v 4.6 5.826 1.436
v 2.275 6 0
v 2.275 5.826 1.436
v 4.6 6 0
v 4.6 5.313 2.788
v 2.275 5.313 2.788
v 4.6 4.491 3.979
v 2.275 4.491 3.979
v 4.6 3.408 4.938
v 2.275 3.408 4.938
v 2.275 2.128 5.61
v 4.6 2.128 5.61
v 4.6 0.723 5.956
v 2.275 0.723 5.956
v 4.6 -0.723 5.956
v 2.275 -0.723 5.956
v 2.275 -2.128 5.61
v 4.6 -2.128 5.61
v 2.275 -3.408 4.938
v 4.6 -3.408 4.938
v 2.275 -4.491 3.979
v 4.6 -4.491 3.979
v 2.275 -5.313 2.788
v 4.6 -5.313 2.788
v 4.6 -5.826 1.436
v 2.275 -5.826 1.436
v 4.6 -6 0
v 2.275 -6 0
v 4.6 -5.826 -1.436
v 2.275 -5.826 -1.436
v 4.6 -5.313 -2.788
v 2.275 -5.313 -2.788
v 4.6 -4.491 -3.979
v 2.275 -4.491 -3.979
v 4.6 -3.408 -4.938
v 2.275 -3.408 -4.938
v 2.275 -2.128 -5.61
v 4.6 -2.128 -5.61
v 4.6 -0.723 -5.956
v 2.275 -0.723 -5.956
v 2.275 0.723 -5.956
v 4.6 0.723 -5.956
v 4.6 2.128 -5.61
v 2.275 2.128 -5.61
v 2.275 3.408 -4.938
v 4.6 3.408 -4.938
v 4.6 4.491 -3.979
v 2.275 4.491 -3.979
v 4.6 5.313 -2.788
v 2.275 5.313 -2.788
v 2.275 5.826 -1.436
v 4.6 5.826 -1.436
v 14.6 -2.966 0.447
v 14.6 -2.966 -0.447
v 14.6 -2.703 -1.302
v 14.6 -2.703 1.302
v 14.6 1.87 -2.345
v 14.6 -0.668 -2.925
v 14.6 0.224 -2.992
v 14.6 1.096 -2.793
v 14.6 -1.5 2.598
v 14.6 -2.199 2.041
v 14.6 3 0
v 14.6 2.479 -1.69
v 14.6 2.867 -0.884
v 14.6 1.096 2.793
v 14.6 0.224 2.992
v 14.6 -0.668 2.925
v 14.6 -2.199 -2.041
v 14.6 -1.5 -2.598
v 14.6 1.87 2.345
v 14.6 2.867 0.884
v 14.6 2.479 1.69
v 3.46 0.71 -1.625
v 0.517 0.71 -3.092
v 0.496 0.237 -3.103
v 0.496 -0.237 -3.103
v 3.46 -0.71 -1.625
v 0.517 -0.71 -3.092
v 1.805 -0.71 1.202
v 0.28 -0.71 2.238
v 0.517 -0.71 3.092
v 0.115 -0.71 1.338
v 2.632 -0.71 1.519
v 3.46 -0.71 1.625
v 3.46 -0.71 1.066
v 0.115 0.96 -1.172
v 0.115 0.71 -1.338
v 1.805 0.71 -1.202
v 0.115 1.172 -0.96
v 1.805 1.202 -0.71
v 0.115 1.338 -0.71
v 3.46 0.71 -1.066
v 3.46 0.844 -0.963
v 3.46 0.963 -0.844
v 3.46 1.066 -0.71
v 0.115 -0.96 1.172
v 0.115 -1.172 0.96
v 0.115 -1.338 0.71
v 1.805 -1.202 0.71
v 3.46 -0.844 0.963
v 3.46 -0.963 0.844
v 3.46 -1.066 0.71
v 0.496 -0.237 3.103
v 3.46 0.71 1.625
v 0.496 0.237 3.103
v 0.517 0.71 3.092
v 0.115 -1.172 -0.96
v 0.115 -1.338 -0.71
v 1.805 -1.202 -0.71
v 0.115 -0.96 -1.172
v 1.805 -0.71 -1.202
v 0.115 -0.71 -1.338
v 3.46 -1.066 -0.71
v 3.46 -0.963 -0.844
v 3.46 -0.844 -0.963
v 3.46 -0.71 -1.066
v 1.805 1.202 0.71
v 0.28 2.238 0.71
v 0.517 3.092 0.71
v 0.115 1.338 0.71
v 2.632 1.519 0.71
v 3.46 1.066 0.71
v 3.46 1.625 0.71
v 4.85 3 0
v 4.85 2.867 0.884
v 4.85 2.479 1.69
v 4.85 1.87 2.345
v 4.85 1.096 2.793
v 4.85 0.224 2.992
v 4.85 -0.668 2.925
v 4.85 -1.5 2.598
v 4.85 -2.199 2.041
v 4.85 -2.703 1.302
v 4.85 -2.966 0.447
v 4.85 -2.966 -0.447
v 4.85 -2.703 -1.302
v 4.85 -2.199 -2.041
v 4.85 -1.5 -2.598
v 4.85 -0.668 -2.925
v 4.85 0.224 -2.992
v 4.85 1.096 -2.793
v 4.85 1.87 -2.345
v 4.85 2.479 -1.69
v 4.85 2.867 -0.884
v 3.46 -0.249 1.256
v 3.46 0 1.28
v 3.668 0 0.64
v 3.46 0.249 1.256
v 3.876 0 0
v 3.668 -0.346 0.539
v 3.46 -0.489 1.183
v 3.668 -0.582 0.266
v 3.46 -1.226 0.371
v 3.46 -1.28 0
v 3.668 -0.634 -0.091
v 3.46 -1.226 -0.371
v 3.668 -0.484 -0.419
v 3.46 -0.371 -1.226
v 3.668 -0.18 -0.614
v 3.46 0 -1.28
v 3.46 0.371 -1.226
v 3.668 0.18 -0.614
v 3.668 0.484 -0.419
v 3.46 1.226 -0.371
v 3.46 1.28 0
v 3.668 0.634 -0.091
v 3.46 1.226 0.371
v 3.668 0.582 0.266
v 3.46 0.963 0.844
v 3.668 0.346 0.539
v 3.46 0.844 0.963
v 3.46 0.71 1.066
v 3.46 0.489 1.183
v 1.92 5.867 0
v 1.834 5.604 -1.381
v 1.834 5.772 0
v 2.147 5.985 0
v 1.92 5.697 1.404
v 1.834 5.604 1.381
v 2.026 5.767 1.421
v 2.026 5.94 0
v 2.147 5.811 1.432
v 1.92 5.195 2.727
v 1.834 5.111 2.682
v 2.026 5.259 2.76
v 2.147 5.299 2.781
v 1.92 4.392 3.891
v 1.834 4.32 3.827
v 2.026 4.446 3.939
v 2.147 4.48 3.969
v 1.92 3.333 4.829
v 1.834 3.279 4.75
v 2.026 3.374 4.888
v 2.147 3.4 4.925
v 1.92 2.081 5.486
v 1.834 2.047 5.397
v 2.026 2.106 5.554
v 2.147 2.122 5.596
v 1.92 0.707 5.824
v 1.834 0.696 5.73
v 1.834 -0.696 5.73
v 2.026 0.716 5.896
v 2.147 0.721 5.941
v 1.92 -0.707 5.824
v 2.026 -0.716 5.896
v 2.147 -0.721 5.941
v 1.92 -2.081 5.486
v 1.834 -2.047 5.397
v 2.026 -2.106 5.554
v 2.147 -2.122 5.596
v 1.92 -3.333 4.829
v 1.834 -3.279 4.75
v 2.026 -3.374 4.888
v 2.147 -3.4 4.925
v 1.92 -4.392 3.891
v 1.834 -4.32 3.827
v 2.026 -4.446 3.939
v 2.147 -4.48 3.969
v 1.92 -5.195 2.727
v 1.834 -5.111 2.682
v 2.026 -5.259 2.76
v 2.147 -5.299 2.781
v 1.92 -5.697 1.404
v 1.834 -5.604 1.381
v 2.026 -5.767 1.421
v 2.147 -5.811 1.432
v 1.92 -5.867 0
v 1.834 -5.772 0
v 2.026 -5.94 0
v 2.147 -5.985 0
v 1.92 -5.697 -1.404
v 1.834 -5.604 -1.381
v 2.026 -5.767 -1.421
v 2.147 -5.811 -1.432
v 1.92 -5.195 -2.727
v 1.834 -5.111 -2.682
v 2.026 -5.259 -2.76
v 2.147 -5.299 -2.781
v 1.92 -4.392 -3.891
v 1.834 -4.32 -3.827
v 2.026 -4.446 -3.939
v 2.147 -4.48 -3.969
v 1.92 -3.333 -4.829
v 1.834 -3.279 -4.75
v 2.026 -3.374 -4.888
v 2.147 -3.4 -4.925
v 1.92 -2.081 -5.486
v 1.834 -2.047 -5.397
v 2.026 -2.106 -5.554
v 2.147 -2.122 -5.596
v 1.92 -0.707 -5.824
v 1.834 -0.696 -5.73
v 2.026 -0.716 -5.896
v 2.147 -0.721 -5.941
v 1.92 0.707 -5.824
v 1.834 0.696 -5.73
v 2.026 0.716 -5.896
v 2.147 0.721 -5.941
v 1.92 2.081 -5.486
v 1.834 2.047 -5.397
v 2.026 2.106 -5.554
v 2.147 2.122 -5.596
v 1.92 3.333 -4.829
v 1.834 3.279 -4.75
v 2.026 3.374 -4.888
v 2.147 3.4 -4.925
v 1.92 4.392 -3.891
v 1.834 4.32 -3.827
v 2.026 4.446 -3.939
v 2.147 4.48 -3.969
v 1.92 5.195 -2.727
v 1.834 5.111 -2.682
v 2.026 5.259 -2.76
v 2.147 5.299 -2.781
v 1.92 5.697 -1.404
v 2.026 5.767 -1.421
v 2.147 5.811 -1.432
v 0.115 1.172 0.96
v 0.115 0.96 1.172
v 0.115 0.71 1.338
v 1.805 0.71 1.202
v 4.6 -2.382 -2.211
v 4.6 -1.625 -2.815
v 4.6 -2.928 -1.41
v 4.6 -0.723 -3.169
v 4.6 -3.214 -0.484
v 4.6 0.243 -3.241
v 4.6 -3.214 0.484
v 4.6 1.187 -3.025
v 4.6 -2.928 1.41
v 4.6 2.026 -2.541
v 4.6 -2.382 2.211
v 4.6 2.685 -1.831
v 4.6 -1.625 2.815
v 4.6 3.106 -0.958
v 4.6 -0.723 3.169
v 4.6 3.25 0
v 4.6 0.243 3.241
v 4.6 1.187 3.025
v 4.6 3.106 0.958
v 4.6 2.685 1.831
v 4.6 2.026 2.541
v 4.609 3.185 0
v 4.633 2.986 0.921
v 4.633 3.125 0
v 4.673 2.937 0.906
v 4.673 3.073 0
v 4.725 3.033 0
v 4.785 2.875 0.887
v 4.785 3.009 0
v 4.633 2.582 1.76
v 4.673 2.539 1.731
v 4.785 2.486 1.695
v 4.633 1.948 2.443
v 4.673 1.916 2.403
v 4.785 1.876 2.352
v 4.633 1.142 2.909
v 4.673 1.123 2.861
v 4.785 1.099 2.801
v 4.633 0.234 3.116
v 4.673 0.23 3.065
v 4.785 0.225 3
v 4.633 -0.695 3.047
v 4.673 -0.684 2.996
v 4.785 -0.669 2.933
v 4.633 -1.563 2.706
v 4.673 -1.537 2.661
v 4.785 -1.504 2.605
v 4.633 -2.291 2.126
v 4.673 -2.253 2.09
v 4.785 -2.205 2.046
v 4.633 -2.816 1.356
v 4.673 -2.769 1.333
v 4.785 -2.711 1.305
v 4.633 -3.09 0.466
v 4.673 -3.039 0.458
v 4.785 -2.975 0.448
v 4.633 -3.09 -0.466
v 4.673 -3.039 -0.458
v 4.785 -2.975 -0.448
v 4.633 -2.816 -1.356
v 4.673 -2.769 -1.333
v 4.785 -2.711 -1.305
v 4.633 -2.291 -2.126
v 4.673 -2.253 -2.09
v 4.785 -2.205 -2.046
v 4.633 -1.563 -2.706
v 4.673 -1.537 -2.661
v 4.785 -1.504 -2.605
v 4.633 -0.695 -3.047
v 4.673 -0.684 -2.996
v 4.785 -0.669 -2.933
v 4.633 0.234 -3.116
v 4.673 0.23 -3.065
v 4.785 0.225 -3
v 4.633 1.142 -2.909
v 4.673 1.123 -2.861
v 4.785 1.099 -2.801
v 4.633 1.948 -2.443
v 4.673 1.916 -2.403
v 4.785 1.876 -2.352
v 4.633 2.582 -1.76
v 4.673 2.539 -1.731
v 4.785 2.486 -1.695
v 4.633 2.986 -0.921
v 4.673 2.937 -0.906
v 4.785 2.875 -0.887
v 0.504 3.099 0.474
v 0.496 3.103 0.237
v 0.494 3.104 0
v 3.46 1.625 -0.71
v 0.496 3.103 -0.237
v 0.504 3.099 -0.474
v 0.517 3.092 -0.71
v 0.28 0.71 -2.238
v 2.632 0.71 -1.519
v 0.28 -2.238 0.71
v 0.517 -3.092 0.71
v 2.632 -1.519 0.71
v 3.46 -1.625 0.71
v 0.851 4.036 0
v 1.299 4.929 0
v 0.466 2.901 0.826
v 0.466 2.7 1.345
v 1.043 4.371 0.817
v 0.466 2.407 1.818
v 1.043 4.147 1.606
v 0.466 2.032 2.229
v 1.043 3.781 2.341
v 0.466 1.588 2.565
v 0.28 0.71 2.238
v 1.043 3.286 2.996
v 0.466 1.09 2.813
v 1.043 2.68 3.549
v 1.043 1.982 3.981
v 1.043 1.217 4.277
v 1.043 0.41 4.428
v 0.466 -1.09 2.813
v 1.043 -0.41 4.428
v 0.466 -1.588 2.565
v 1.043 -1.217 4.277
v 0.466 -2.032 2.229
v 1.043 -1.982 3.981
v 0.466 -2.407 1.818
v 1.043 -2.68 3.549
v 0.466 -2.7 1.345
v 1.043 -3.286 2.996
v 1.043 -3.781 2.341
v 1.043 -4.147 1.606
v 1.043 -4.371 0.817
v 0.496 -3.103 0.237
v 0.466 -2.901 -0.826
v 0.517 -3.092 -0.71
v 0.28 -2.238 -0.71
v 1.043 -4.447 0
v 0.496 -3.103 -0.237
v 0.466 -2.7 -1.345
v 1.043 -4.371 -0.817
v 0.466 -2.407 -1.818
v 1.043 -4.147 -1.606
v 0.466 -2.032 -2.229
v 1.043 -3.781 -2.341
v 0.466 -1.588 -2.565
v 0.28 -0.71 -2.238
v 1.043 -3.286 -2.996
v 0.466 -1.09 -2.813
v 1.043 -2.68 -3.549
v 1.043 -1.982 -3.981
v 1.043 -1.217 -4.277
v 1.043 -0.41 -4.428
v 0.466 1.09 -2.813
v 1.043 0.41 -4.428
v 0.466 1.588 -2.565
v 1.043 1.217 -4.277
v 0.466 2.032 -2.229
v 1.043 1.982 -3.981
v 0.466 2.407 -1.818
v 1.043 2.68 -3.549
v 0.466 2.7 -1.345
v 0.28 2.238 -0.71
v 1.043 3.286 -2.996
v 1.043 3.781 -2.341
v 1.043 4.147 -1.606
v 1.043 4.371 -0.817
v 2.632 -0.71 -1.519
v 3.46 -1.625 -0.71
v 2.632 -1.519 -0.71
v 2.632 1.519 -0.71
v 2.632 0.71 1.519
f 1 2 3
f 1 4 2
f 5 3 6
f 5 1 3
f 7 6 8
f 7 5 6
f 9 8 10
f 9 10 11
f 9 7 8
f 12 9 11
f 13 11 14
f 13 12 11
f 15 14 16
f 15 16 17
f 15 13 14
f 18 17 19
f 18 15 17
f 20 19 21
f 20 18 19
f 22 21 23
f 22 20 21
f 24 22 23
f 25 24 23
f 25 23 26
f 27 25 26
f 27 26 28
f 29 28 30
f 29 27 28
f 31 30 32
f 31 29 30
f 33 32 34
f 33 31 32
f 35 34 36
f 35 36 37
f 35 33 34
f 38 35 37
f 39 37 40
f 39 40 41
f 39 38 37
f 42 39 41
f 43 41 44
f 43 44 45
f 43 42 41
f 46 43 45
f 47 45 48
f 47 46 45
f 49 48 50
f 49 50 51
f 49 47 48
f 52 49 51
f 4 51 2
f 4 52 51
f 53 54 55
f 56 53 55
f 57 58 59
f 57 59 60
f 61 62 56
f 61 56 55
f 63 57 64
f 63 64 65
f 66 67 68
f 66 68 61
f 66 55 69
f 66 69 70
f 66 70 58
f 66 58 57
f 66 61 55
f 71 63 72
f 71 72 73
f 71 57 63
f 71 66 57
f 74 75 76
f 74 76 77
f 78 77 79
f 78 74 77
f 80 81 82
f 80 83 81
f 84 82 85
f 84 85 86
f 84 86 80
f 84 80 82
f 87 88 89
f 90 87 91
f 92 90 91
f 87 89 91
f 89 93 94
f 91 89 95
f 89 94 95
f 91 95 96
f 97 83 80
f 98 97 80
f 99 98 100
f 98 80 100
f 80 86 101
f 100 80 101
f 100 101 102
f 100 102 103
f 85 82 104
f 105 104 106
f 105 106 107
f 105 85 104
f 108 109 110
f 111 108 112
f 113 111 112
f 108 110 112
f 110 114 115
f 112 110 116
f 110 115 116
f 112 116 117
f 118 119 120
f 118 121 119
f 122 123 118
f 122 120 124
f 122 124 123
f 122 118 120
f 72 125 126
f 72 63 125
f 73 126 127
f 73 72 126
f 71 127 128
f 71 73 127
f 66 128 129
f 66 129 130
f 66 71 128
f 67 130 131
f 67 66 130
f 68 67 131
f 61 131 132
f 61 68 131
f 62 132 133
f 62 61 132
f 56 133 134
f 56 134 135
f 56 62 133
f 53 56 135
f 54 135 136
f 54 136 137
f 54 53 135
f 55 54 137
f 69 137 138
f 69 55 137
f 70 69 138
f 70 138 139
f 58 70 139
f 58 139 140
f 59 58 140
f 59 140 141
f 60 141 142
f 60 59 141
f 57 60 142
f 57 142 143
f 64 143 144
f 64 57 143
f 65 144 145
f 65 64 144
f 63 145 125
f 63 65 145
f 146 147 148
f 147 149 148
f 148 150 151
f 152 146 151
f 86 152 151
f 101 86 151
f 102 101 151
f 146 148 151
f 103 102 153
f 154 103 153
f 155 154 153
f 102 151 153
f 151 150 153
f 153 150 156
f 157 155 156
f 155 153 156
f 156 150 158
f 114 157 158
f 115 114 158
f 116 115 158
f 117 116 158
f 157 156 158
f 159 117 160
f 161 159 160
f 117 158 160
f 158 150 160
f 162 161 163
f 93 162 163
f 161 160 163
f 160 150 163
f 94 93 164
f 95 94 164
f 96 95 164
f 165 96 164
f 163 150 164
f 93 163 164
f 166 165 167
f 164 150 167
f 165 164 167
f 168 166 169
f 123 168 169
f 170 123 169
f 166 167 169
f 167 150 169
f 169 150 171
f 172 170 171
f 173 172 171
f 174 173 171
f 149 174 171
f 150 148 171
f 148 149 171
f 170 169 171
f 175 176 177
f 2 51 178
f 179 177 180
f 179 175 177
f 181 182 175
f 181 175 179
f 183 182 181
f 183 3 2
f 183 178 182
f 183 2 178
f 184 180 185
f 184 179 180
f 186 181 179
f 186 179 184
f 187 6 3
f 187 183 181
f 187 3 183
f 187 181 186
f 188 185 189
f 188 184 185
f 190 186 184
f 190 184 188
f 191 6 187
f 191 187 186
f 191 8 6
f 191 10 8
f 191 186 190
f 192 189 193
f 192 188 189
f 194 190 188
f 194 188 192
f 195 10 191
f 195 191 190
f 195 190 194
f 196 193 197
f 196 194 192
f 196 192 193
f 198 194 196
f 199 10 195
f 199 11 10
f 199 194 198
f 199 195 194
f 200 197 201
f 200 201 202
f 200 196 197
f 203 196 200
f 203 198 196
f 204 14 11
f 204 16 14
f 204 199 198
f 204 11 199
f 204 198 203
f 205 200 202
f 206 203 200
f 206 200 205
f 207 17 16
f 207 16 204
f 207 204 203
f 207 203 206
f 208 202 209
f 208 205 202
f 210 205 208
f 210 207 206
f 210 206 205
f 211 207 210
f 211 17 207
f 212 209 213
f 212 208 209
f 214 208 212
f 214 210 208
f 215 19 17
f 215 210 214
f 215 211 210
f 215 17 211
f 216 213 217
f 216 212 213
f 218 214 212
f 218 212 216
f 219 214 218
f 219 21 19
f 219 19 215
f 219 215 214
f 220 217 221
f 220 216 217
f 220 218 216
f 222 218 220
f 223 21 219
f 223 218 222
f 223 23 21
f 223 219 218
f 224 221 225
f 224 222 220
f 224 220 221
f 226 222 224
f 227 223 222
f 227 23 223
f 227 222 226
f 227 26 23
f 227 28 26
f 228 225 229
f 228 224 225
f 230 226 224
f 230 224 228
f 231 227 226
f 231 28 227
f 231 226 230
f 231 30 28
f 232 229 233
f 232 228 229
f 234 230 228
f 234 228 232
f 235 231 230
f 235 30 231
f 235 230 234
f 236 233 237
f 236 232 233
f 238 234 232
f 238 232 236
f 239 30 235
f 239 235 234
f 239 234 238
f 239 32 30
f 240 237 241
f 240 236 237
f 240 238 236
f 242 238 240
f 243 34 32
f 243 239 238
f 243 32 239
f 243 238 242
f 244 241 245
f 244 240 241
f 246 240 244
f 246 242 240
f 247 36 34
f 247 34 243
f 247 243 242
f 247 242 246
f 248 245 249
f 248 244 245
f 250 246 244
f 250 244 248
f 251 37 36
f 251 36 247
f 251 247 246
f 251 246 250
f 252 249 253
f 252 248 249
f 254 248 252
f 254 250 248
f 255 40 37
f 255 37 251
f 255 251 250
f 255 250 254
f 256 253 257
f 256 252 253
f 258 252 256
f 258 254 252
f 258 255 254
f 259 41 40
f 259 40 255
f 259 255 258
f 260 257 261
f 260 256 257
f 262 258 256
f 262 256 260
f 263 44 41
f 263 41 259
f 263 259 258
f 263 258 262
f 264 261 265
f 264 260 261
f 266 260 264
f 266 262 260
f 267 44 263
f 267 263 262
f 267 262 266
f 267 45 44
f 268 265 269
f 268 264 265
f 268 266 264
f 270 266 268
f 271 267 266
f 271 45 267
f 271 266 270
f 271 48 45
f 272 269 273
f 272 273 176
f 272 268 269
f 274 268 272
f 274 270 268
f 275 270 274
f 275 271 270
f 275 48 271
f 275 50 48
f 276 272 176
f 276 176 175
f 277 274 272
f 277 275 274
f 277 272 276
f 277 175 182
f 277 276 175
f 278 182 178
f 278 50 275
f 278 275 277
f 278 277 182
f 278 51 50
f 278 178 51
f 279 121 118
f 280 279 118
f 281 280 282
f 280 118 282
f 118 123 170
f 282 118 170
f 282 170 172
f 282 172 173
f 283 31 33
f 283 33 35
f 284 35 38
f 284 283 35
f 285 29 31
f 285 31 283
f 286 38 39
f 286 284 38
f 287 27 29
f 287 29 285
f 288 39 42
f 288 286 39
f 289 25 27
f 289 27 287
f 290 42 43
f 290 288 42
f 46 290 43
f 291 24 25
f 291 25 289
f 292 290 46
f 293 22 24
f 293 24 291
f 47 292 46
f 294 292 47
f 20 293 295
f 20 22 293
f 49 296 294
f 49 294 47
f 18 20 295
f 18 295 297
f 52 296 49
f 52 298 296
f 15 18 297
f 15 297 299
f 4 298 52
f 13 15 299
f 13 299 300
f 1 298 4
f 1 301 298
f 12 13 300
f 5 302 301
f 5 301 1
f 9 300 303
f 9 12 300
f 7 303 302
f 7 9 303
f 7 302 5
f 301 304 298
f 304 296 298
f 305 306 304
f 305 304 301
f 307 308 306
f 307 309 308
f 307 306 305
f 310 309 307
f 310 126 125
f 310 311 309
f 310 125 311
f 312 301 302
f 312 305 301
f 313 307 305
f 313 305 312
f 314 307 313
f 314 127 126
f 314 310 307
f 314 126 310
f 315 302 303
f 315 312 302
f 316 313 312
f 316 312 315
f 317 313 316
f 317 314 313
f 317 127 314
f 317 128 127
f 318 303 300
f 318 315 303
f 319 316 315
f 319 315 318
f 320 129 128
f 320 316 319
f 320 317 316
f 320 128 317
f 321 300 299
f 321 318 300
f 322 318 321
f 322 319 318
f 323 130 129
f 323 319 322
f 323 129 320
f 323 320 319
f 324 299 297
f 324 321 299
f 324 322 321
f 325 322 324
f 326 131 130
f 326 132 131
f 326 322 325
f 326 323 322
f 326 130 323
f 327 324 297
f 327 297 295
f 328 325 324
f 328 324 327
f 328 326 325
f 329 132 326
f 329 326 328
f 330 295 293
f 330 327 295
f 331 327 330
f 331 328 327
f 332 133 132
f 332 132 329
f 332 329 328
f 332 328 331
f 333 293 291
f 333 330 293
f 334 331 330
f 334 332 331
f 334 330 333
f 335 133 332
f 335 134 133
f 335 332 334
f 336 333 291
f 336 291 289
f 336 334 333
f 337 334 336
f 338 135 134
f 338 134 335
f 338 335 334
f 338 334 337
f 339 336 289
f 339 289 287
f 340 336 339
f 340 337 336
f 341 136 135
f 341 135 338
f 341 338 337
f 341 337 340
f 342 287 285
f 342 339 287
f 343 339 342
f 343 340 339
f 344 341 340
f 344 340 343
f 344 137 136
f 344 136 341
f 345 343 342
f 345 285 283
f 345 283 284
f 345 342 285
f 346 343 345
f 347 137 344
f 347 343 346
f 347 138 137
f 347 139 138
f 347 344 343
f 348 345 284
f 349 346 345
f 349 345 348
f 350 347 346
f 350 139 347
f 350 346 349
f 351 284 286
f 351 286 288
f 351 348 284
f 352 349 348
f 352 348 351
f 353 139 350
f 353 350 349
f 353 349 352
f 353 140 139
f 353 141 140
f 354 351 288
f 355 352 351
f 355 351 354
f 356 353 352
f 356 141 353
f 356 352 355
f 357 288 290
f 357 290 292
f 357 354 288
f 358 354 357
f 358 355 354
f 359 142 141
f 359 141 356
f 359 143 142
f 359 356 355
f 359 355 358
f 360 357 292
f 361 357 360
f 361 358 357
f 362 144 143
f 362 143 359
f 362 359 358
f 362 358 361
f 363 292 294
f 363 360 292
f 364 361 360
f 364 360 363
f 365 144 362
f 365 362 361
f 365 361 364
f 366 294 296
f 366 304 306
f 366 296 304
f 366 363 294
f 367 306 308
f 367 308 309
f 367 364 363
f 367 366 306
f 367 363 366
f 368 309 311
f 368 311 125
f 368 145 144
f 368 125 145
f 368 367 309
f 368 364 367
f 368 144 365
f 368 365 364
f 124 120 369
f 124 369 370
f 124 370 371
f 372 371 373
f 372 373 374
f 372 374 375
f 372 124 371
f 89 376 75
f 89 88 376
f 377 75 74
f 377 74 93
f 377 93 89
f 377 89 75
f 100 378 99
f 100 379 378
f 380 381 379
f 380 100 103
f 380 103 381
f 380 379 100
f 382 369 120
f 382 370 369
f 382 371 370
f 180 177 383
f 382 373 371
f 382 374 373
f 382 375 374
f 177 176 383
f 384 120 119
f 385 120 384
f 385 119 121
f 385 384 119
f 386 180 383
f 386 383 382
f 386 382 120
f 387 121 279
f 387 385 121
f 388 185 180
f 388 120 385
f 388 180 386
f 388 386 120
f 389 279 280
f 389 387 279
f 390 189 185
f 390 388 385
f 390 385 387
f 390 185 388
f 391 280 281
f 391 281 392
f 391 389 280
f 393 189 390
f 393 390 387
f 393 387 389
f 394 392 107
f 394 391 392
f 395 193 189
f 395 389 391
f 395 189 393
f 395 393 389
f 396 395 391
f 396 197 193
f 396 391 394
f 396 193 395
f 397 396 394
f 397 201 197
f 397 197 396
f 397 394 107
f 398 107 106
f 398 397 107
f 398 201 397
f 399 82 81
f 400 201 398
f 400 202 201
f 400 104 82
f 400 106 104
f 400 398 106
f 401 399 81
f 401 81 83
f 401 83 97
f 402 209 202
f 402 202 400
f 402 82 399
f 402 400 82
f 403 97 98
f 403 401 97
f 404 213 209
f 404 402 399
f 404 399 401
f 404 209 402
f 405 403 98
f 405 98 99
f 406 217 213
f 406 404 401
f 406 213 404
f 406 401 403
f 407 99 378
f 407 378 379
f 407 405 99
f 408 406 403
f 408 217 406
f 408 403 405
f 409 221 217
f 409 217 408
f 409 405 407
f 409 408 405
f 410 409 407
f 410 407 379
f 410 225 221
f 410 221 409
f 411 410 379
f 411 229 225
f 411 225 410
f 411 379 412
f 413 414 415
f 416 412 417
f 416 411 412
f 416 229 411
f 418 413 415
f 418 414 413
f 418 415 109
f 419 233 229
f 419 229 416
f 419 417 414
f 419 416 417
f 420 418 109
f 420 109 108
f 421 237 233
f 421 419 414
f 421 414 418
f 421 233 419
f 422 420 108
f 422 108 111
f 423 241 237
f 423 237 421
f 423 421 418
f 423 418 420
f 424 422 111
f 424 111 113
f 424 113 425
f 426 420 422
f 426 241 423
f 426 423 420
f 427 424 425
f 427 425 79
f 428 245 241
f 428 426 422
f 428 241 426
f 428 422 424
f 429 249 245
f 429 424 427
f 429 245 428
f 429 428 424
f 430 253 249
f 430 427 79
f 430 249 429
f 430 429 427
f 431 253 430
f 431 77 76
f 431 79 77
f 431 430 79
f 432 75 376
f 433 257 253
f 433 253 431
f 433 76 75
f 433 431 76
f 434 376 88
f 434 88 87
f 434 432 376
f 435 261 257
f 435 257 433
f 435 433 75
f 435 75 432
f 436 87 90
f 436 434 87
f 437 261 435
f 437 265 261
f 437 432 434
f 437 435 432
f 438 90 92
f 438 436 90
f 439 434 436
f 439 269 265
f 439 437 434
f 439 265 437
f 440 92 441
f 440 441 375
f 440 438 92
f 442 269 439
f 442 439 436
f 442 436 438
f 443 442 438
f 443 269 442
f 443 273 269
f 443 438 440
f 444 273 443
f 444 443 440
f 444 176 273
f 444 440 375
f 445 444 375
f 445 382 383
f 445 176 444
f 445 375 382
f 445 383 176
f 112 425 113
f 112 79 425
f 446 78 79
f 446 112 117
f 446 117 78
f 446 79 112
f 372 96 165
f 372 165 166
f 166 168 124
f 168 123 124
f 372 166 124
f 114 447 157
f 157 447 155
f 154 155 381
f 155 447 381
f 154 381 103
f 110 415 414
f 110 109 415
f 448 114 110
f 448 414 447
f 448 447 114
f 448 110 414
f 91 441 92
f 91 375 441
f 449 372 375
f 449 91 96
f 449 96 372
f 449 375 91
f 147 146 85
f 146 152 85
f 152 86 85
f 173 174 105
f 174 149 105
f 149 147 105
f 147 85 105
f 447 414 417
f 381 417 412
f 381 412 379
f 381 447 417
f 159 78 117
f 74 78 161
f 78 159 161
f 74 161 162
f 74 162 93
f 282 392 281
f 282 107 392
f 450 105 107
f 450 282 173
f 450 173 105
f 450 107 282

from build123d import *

# Parameters (mm, degrees)
RECPAT_COUNT = 2
RECPAT_ANGLE = 90


with BuildPart() as part:
    # Fillet1: read off the stored shape, not the designer's step
    # Fillet1 outline → Fillet1 (revolve)
    with BuildSketch(Plane.YX):
        with BuildLine():
            Line((3, 4.85), (3, 14.6))
            Line((3, 14.6), (0, 14.6))
            Line((0, 14.6), (0, 0))
            ThreePointArc((0, 0), (3.027985079, 0.469454036), (5.771670194, 1.833738728))
            ThreePointArc((5.771670194, 1.833738728), (5.939532013, 2.026424569), (6, 2.274716834))
            Line((6, 2.274716834), (6, 4.6))
            Line((6, 4.6), (3.25, 4.6))
            ThreePointArc((3.25, 4.6), (3.073223305, 4.673223305), (3, 4.85))
        make_face()
    revolve(axis=Axis((0, 0, 0), (1, 0, 0)))

    # Sketch3 → Recess section 0
    with BuildSketch(Plane(origin=(0, 0, 0), x_dir=(0, 0, -1), z_dir=(1, 0, 0))):
        with BuildLine():
            Line((0.71, -3.35), (-0.71, -3.35))
            Line((-0.71, -3.35), (-0.71, 3.35))
            Line((-0.71, 3.35), (0.71, 3.35))
            Line((0.71, 3.35), (0.71, -3.35))
        make_face()
    # Sketch4 → Recess section 1
    with BuildSketch(Plane(origin=(3.46, 0, 0), x_dir=(0, 0, -1), z_dir=(1, 0, 0))):
        with BuildLine():
            Line((0.71, -1.624907925), (-0.71, -1.624907925))
            Line((-0.71, -1.624907925), (-0.71, 1.624907925))
            Line((-0.71, 1.624907925), (0.71, 1.624907925))
            Line((0.71, 1.624907925), (0.71, -1.624907925))
        make_face()
    recess = loft(mode=Mode.SUBTRACT)

    # RecPat: Recess ×2 about axis
    recpat_axis = Axis((0, 0, 0), (1, 0, 0))
    for i in range(1, RECPAT_COUNT):
        add(recess.rotate(recpat_axis, i * RECPAT_ANGLE / (RECPAT_COUNT - 1)), mode=Mode.SUBTRACT)

    # RecCorSke → RecessCore (revolve, cut)
    with BuildSketch(Plane.XY, mode=Mode.PRIVATE) as recesscore_sk:
        Polygon((0, 0), (0, 1.522446769), (3.46, 1.2805), (3.876059671, 0), align=None)
    revolve(recesscore_sk.sketch.rotate(Axis((-3.175, 0, 0), (1, 0, 0)), 90), axis=Axis((-3.175, 0, 0), (1, 0, 0)), mode=Mode.SUBTRACT)


solid = part.part
